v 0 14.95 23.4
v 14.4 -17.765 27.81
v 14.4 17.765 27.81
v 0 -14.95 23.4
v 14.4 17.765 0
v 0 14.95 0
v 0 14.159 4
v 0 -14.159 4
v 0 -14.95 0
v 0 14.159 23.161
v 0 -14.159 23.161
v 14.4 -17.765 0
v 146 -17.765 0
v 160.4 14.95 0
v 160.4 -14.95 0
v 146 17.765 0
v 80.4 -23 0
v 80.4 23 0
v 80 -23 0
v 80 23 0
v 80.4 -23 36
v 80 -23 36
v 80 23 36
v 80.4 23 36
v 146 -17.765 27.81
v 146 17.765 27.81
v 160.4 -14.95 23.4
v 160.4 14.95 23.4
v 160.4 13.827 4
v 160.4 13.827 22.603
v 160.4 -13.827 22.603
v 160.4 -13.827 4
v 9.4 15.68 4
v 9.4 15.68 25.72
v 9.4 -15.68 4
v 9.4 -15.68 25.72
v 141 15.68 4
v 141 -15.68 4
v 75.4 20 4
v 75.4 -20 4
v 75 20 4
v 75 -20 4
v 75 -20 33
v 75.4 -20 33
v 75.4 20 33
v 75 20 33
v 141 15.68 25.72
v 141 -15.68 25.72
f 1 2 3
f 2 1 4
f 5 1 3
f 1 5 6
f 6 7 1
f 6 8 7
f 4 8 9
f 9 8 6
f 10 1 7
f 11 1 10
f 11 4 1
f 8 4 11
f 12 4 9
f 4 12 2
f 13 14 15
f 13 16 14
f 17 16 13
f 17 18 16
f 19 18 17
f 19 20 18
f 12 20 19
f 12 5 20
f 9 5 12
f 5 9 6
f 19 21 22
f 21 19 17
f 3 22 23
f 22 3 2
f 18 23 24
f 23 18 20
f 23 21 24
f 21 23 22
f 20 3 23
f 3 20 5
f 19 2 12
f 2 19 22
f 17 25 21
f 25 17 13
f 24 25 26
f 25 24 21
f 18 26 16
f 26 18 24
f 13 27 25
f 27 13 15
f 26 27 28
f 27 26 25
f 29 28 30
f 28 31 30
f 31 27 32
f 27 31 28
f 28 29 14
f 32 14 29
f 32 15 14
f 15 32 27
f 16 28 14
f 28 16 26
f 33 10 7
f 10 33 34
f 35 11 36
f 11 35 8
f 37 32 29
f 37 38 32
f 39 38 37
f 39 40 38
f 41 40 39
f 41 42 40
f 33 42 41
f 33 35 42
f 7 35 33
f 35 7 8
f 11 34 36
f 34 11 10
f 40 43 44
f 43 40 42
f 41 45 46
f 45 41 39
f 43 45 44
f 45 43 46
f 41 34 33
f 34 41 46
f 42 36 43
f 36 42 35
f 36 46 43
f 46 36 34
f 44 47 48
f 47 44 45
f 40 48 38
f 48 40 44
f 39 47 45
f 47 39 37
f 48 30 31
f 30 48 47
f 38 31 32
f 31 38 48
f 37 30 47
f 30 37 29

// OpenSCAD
$fn = 32;

// ----------------------------------------------------------------------
// Faired channel: 160 x 46 x 36 mm, 3 mm walls, faired ends
// ----------------------------------------------------------------------

// --- parameters (mm) ---
length = 160;             // channel length
width = 46;               // channel width at mid length
height = 36;              // channel height at mid length
wall = 3;                 // side wall thickness
floor_t = 4;              // floor thickness
end_w = 29.9;             // faired end width
end_h = 23.4;             // faired end height

difference() {
  union() {
    hull() {
      translate([0, -14.95, 0]) cube([0.4, 29.9, 23.4]);
      translate([14.4, -17.765, 0]) cube([0.4, 35.53, 27.81]);
    }
    hull() {
      translate([14.4, -17.765, 0]) cube([0.4, 35.53, 27.81]);
      translate([80, -23, 0]) cube([0.4, 46, 36]);
    }
    hull() {
      translate([80, -23, 0]) cube([0.4, 46, 36]);
      translate([145.6, -17.765, 0]) cube([0.4, 35.53, 27.81]);
    }
    hull() {
      translate([145.6, -17.765, 0]) cube([0.4, 35.53, 27.81]);
      translate([160, -14.95, 0]) cube([0.4, 29.9, 23.4]);
    }
  }
  /* cavity, 5 mm proud of both ends so the ports are cut clean */
  hull() {
    translate([-5, -13.35, 4]) cube([0.4, 26.7, 17.8]);
    translate([9.4, -15.68, 4]) cube([0.4, 31.36, 21.72]);
  }
  hull() {
    translate([9.4, -15.68, 4]) cube([0.4, 31.36, 21.72]);
    translate([75, -20, 4]) cube([0.4, 40, 29]);
  }
  hull() {
    translate([75, -20, 4]) cube([0.4, 40, 29]);
    translate([140.6, -15.68, 4]) cube([0.4, 31.36, 21.72]);
  }
  hull() {
    translate([140.6, -15.68, 4]) cube([0.4, 31.36, 21.72]);
    translate([165, -13.35, 4]) cube([0.4, 26.7, 17.8]);
  }
}
